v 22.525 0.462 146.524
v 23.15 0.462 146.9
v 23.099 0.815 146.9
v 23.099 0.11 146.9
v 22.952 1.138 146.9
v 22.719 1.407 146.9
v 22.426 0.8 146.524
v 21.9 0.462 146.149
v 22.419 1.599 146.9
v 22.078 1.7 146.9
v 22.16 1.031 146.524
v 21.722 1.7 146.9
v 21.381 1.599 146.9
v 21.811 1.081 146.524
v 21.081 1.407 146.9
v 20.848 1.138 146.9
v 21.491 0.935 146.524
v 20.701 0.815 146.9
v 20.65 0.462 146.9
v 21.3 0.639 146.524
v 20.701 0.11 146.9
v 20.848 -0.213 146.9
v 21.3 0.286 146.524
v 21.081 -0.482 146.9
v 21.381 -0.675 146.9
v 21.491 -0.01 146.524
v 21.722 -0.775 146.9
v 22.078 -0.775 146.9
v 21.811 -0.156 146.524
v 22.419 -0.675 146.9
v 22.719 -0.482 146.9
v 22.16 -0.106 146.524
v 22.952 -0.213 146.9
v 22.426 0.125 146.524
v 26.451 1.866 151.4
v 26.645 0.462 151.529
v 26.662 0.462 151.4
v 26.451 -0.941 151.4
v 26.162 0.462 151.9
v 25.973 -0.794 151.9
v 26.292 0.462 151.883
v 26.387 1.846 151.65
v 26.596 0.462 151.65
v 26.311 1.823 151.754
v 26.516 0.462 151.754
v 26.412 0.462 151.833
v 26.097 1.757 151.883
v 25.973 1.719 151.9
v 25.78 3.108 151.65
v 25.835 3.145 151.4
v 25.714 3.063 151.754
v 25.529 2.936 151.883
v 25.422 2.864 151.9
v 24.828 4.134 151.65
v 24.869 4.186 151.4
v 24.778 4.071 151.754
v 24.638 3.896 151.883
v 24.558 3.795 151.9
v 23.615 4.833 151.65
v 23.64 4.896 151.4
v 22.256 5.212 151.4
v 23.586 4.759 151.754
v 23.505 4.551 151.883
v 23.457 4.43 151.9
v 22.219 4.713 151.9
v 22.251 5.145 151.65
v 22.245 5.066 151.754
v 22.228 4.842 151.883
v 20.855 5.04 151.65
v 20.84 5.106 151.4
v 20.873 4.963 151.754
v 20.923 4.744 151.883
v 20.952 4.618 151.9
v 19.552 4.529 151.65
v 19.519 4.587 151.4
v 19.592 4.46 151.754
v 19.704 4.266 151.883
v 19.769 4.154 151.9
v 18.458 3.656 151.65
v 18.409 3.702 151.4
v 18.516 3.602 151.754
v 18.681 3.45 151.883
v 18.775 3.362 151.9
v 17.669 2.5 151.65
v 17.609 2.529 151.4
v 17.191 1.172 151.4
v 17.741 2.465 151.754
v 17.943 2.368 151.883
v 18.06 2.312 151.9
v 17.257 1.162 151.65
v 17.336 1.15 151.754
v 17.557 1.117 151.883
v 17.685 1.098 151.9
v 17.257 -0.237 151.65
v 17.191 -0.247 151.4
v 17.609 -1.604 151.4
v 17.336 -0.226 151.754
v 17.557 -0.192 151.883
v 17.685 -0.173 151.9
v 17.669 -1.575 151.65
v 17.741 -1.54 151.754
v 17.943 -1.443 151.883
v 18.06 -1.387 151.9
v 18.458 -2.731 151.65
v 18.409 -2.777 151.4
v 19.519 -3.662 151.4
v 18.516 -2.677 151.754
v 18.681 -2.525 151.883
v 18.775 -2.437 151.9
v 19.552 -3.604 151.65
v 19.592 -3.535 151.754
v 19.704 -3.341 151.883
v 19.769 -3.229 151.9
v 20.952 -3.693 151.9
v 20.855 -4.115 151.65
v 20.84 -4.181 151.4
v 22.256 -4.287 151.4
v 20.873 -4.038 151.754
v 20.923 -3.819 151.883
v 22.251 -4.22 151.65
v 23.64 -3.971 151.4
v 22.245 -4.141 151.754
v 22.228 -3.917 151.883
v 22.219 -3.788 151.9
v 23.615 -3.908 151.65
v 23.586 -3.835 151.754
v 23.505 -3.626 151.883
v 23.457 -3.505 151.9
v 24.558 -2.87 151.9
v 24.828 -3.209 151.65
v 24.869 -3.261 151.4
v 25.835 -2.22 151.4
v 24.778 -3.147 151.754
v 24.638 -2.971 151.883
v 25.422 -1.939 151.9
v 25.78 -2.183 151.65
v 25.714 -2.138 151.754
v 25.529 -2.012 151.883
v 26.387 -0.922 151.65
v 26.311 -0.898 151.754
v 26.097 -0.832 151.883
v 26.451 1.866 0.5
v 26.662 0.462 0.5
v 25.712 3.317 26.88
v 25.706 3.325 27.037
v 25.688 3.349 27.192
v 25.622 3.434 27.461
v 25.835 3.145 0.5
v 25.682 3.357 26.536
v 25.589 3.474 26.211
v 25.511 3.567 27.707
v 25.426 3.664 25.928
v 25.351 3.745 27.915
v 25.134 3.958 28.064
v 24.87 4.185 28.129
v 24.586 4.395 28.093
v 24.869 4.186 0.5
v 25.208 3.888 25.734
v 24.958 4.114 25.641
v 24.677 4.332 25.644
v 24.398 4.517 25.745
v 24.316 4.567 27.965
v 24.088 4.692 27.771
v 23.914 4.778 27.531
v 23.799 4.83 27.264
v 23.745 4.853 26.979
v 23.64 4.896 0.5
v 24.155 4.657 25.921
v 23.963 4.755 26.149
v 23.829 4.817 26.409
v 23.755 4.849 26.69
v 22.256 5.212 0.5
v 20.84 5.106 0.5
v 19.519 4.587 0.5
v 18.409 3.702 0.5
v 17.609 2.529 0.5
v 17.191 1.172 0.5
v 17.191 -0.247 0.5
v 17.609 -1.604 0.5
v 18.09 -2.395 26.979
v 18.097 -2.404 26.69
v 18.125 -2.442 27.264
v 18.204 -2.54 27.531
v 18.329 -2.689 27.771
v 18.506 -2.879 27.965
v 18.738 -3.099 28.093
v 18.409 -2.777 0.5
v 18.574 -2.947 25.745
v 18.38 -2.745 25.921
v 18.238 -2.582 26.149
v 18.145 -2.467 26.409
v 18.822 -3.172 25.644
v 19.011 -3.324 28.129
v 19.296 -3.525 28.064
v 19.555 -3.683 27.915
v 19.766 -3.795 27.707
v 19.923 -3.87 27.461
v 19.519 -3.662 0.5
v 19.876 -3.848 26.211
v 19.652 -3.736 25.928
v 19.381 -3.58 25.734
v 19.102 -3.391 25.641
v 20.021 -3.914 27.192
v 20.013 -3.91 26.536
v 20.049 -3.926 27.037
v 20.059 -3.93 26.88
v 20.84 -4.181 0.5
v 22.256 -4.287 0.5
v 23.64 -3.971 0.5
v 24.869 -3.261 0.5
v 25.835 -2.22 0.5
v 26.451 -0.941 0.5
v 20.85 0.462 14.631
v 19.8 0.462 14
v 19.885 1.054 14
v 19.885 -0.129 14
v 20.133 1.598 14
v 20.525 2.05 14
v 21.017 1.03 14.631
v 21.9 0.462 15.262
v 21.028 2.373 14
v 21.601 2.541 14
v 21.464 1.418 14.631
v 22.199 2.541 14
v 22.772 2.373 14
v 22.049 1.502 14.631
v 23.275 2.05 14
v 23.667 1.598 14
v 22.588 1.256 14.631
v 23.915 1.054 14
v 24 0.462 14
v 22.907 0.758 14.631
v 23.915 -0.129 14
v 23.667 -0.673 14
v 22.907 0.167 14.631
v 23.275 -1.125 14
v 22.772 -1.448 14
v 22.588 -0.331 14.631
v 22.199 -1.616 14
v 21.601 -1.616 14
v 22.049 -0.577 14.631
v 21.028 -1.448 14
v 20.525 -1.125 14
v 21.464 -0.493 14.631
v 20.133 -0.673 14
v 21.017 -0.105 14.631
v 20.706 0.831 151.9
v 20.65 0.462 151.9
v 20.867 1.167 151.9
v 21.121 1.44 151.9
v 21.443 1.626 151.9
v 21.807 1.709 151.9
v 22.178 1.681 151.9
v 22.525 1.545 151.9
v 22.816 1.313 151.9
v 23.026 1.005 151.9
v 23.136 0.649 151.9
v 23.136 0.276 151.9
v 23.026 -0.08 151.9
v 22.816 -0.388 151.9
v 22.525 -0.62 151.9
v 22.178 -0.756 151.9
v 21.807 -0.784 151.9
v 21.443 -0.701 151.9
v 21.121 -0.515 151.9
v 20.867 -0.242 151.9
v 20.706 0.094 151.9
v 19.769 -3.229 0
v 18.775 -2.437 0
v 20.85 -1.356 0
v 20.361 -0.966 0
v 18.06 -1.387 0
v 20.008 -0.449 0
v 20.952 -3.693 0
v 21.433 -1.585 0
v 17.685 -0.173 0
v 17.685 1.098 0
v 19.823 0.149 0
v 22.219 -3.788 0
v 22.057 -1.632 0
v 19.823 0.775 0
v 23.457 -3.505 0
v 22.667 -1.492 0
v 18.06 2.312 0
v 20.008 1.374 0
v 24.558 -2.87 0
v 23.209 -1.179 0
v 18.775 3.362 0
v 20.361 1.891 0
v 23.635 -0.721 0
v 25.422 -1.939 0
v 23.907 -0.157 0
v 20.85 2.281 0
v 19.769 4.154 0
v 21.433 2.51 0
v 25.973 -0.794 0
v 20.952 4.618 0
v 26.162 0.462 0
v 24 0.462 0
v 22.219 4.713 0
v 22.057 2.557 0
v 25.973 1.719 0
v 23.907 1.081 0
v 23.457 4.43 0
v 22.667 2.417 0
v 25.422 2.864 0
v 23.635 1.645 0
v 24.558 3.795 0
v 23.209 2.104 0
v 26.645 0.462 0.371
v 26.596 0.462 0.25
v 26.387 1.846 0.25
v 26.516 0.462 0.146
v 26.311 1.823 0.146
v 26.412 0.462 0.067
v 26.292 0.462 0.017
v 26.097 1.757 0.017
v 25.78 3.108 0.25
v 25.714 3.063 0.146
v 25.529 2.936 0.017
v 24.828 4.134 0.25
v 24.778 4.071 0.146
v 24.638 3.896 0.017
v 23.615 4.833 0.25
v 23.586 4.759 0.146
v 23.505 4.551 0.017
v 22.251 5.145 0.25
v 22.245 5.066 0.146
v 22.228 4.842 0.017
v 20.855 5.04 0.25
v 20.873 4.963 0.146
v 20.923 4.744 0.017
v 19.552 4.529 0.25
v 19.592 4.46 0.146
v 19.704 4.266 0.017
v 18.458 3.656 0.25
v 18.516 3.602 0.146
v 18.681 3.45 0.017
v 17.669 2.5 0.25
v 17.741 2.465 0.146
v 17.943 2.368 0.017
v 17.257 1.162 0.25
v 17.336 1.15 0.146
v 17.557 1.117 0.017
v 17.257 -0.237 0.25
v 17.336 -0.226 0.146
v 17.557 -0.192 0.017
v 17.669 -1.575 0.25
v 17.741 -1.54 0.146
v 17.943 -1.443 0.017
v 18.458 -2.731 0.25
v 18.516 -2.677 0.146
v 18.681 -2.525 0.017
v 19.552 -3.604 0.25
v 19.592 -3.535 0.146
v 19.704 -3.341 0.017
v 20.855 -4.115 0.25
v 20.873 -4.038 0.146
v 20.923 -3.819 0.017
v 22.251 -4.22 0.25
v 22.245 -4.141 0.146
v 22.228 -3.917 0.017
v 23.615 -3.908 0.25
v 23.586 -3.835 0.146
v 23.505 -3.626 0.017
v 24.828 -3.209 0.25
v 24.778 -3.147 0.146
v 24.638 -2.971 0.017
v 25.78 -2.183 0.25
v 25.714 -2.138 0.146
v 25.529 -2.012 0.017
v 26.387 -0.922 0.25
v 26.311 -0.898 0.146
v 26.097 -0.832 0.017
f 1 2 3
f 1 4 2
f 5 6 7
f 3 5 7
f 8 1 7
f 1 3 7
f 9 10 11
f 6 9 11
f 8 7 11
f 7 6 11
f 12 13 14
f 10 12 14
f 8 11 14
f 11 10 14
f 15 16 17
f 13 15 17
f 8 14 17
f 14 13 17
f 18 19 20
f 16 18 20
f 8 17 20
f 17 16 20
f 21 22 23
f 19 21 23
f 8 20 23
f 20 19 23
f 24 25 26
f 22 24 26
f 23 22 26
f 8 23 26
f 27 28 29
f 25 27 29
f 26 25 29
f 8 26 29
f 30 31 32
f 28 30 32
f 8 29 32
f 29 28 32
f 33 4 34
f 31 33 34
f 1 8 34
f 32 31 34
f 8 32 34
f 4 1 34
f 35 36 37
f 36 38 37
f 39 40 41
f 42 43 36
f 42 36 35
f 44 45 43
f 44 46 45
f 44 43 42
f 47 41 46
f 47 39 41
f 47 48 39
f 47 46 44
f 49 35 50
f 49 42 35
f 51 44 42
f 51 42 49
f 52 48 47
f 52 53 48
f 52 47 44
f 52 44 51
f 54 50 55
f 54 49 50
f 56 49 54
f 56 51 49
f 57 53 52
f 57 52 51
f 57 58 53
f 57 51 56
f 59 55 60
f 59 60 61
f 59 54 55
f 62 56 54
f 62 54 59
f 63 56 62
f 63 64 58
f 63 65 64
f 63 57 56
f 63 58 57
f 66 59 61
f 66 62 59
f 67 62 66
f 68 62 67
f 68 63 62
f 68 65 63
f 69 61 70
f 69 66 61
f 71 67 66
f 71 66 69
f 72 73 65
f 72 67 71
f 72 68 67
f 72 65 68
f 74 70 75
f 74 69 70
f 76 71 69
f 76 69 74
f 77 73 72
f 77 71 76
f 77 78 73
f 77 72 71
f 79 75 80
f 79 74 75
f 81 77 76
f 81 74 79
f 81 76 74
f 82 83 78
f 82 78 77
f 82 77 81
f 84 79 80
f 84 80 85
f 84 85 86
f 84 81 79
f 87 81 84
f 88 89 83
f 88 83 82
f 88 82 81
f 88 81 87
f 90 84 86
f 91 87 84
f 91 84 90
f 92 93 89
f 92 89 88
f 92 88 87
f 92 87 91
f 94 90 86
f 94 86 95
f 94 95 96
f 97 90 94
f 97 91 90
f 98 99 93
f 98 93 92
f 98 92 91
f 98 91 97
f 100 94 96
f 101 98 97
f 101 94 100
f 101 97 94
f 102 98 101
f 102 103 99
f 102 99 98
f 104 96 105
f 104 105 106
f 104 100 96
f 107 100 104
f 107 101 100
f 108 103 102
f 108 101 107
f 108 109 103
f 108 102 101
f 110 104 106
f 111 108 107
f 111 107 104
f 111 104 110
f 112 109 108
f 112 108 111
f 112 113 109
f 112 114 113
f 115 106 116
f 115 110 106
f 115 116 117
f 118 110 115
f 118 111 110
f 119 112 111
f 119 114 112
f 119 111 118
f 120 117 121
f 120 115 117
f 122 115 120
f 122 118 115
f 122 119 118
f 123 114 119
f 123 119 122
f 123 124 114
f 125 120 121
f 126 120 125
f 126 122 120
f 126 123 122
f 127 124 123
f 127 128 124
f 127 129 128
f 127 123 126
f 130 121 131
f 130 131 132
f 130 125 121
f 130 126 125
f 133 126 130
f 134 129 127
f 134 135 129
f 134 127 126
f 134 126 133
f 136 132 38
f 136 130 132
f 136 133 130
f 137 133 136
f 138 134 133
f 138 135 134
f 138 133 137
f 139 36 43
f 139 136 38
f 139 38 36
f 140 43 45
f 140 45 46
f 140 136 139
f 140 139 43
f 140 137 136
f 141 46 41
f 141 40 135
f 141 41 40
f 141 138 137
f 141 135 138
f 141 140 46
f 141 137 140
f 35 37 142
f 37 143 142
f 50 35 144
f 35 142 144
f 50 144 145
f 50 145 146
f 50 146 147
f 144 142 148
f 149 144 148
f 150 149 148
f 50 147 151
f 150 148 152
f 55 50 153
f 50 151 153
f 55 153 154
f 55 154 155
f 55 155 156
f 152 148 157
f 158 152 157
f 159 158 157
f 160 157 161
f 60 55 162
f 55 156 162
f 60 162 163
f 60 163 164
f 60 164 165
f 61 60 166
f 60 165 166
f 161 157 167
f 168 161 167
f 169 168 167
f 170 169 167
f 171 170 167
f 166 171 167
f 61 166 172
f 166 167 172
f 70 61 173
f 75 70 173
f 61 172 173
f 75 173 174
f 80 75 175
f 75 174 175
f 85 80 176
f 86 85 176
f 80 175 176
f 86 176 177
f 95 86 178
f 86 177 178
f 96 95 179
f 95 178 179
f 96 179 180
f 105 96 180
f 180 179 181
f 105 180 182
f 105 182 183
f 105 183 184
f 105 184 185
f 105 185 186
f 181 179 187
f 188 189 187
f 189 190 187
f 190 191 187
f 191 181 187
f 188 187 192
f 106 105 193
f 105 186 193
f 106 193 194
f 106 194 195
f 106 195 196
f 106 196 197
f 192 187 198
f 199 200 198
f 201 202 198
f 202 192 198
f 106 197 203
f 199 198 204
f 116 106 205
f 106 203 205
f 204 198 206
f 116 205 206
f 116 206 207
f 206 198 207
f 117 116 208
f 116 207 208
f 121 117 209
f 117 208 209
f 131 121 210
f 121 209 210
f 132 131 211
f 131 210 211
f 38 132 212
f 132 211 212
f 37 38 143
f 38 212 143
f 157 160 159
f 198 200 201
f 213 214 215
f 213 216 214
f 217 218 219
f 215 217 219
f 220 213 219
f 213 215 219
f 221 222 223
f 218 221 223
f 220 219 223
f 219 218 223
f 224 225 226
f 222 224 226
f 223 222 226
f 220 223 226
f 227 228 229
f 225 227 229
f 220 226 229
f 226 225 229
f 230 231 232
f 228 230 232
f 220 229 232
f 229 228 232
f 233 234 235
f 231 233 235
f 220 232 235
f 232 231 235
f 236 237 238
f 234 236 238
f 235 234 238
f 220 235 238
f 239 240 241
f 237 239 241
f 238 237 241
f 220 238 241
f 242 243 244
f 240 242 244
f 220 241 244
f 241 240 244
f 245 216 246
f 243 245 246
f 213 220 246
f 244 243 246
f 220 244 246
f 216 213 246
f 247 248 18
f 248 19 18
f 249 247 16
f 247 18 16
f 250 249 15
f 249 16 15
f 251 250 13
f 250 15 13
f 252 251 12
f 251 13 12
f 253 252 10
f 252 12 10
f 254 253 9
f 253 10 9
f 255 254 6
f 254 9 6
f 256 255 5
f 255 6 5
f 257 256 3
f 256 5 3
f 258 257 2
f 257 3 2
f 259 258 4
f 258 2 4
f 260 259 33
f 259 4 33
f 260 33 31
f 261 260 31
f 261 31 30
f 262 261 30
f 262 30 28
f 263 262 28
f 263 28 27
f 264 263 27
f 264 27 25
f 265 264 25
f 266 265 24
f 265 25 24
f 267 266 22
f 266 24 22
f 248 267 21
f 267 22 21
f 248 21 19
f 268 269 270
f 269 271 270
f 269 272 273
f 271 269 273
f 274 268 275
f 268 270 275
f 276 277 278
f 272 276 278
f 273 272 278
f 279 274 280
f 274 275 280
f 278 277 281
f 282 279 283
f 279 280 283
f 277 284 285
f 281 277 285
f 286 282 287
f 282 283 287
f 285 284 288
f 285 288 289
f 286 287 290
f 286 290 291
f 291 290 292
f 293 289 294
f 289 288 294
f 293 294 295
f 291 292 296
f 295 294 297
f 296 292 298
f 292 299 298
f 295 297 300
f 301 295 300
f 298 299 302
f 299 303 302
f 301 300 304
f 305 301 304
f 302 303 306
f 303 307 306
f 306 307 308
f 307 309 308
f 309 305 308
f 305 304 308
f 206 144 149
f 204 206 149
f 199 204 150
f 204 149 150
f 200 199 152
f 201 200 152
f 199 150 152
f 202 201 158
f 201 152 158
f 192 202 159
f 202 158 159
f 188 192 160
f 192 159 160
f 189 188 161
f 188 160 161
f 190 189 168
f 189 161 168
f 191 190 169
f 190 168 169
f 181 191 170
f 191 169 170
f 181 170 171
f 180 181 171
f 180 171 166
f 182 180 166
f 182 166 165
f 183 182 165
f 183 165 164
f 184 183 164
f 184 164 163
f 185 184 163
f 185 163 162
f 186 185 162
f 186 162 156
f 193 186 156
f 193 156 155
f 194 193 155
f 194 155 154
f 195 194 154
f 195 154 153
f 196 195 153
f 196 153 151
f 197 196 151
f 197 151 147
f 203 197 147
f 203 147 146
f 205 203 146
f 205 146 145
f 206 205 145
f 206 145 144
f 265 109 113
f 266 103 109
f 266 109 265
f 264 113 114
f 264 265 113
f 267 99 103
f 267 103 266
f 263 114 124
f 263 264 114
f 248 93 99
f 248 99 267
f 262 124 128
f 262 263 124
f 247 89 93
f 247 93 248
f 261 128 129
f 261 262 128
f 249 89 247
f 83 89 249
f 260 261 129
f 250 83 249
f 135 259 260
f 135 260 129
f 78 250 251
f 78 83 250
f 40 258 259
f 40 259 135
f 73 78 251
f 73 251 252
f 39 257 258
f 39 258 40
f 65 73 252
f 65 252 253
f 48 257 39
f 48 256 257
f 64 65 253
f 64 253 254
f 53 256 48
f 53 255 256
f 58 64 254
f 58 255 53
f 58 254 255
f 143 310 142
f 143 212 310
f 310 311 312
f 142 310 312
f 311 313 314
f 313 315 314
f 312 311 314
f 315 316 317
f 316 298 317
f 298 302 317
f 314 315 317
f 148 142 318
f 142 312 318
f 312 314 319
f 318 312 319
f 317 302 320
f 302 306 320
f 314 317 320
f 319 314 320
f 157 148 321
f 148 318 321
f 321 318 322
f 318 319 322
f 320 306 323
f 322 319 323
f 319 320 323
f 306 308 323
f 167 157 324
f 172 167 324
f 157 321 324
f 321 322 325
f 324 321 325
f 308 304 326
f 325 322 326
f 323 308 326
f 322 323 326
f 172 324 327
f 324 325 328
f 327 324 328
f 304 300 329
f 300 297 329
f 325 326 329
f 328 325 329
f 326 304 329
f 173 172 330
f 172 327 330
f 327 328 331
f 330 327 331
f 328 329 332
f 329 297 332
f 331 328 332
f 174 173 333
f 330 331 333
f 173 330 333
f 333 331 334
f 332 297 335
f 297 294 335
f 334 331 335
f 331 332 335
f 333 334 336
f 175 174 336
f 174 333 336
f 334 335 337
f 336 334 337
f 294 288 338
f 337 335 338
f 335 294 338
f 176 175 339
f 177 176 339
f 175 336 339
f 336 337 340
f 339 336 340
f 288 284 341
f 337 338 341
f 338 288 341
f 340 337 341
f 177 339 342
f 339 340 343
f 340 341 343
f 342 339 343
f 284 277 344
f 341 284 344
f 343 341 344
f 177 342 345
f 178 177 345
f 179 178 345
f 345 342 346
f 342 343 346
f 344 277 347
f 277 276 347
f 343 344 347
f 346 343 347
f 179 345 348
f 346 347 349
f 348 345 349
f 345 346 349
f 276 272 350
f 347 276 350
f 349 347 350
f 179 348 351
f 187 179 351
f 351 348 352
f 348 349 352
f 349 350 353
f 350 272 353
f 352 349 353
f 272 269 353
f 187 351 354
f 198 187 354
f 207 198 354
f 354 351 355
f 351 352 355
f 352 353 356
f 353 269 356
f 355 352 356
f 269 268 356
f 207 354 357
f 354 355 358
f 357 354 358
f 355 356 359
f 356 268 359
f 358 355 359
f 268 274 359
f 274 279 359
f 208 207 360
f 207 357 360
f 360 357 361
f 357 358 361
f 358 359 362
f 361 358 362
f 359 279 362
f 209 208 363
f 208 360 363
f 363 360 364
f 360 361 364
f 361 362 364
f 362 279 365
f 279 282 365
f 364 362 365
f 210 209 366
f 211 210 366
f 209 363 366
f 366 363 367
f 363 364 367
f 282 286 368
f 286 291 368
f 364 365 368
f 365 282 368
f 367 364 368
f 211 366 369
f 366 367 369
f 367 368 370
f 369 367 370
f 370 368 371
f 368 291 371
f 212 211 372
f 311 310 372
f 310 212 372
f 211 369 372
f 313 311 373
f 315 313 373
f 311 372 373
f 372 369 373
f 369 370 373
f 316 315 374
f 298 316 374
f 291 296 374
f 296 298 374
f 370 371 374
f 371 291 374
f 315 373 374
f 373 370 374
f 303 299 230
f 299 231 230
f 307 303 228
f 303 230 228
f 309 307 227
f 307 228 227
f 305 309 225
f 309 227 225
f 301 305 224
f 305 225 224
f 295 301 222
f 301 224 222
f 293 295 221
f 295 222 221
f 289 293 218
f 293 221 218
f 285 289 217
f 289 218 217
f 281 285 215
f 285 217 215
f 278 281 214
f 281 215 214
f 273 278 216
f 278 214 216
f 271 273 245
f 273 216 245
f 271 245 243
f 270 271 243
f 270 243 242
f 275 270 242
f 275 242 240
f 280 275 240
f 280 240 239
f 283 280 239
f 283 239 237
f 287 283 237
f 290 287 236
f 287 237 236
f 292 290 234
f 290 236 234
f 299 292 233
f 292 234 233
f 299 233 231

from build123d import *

# Parameters (mm, degrees)
ESBO_O1_R                                      = 4.7625
RESSALTO_EXTRUS_O1_DEPTH                       = 151.9
FURO_ROSCADO_DE_M5X0_81_D                      = 4.2
FURO_ROSCADO_DE_M5X0_81_DEPTH                  = 14
FURO_ROSCADO_DE_M5X0_81_TIP                    = 1.2618073
FILETE1_R                                      = 0.5
BROCA_DE_ROSQUEAR_PARA_TARRAXA_DE_M3X0_5_D     = 2.5
BROCA_DE_ROSQUEAR_PARA_TARRAXA_DE_M3X0_5_DEPTH = 5
BROCA_DE_ROSQUEAR_PARA_TARRAXA_DE_M3X0_5_TIP   = 0.751075774
FILETE2_R                                      = 0.5
BROCA_DE_ROSQUEAR_PARA_TARRAXA_DE_M3_2_D       = 2.5
BROCA_DE_ROSQUEAR_PARA_TARRAXA_DE_M3_2_DEPTH   = 10
BROCA_DE_ROSQUEAR_PARA_TARRAXA_DE_M3_2_TIP     = 0.751075774


with BuildPart() as part:
    # Esboço1 → Ressalto-extrusão1 (new body)
    with BuildSketch(Plane.XY):
        with Locations((21.9, 0.462441068)):
            Circle(ESBO_O1_R)
    extrude(amount=RESSALTO_EXTRUS_O1_DEPTH)

    # Furo roscado de M5x0.81
    with Locations(Plane(origin=(0, 0, 0), x_dir=(-1, 0, 0), z_dir=(0, 0, -1))):
        with Locations((-21.9, 0.462441068)):
            Hole(FURO_ROSCADO_DE_M5X0_81_D / 2, depth=FURO_ROSCADO_DE_M5X0_81_DEPTH)
            with Locations((0, 0, -(FURO_ROSCADO_DE_M5X0_81_DEPTH + FURO_ROSCADO_DE_M5X0_81_TIP / 2))):  # 118° drill point
                Cone(0, FURO_ROSCADO_DE_M5X0_81_D / 2, FURO_ROSCADO_DE_M5X0_81_TIP, mode=Mode.SUBTRACT)

    # Filete1
    filete1_edges = [part.edges().sort_by_distance(p)[0] for p in [
        (17.1375, 0.462441068, 0),
    ]]
    fillet(filete1_edges, radius=FILETE1_R)

    # Broca de rosquear para tarraxa de M3x0.5
    with Locations(Plane.XY.offset(151.9)):
        with Locations((21.9, 0.462441068)):
            Hole(BROCA_DE_ROSQUEAR_PARA_TARRAXA_DE_M3X0_5_D / 2, depth=BROCA_DE_ROSQUEAR_PARA_TARRAXA_DE_M3X0_5_DEPTH)
            with Locations((0, 0, -(BROCA_DE_ROSQUEAR_PARA_TARRAXA_DE_M3X0_5_DEPTH + BROCA_DE_ROSQUEAR_PARA_TARRAXA_DE_M3X0_5_TIP / 2))):  # 118° drill point
                Cone(0, BROCA_DE_ROSQUEAR_PARA_TARRAXA_DE_M3X0_5_D / 2, BROCA_DE_ROSQUEAR_PARA_TARRAXA_DE_M3X0_5_TIP, mode=Mode.SUBTRACT)

    # Filete2
    filete2_edges = [part.edges().sort_by_distance(p)[0] for p in [
        (17.1375, 0.462441068, 151.9),
    ]]
    fillet(filete2_edges, radius=FILETE2_R)

    # Broca de rosquear para tarraxa de M3 2
    with Locations(Plane(origin=(18.970347391, -3.292361436, 26.879843119), x_dir=(-0.78840997447, 0.615150154154, 0), z_dir=(-0.615150154154, -0.78840997447, 0))):
        with Locations((0, 0)):
            Hole(BROCA_DE_ROSQUEAR_PARA_TARRAXA_DE_M3_2_D / 2, depth=BROCA_DE_ROSQUEAR_PARA_TARRAXA_DE_M3_2_DEPTH)
            with Locations((0, 0, -(BROCA_DE_ROSQUEAR_PARA_TARRAXA_DE_M3_2_DEPTH + BROCA_DE_ROSQUEAR_PARA_TARRAXA_DE_M3_2_TIP / 2))):  # 118° drill point
                Cone(0, BROCA_DE_ROSQUEAR_PARA_TARRAXA_DE_M3_2_D / 2, BROCA_DE_ROSQUEAR_PARA_TARRAXA_DE_M3_2_TIP, mode=Mode.SUBTRACT)


solid = part.part
